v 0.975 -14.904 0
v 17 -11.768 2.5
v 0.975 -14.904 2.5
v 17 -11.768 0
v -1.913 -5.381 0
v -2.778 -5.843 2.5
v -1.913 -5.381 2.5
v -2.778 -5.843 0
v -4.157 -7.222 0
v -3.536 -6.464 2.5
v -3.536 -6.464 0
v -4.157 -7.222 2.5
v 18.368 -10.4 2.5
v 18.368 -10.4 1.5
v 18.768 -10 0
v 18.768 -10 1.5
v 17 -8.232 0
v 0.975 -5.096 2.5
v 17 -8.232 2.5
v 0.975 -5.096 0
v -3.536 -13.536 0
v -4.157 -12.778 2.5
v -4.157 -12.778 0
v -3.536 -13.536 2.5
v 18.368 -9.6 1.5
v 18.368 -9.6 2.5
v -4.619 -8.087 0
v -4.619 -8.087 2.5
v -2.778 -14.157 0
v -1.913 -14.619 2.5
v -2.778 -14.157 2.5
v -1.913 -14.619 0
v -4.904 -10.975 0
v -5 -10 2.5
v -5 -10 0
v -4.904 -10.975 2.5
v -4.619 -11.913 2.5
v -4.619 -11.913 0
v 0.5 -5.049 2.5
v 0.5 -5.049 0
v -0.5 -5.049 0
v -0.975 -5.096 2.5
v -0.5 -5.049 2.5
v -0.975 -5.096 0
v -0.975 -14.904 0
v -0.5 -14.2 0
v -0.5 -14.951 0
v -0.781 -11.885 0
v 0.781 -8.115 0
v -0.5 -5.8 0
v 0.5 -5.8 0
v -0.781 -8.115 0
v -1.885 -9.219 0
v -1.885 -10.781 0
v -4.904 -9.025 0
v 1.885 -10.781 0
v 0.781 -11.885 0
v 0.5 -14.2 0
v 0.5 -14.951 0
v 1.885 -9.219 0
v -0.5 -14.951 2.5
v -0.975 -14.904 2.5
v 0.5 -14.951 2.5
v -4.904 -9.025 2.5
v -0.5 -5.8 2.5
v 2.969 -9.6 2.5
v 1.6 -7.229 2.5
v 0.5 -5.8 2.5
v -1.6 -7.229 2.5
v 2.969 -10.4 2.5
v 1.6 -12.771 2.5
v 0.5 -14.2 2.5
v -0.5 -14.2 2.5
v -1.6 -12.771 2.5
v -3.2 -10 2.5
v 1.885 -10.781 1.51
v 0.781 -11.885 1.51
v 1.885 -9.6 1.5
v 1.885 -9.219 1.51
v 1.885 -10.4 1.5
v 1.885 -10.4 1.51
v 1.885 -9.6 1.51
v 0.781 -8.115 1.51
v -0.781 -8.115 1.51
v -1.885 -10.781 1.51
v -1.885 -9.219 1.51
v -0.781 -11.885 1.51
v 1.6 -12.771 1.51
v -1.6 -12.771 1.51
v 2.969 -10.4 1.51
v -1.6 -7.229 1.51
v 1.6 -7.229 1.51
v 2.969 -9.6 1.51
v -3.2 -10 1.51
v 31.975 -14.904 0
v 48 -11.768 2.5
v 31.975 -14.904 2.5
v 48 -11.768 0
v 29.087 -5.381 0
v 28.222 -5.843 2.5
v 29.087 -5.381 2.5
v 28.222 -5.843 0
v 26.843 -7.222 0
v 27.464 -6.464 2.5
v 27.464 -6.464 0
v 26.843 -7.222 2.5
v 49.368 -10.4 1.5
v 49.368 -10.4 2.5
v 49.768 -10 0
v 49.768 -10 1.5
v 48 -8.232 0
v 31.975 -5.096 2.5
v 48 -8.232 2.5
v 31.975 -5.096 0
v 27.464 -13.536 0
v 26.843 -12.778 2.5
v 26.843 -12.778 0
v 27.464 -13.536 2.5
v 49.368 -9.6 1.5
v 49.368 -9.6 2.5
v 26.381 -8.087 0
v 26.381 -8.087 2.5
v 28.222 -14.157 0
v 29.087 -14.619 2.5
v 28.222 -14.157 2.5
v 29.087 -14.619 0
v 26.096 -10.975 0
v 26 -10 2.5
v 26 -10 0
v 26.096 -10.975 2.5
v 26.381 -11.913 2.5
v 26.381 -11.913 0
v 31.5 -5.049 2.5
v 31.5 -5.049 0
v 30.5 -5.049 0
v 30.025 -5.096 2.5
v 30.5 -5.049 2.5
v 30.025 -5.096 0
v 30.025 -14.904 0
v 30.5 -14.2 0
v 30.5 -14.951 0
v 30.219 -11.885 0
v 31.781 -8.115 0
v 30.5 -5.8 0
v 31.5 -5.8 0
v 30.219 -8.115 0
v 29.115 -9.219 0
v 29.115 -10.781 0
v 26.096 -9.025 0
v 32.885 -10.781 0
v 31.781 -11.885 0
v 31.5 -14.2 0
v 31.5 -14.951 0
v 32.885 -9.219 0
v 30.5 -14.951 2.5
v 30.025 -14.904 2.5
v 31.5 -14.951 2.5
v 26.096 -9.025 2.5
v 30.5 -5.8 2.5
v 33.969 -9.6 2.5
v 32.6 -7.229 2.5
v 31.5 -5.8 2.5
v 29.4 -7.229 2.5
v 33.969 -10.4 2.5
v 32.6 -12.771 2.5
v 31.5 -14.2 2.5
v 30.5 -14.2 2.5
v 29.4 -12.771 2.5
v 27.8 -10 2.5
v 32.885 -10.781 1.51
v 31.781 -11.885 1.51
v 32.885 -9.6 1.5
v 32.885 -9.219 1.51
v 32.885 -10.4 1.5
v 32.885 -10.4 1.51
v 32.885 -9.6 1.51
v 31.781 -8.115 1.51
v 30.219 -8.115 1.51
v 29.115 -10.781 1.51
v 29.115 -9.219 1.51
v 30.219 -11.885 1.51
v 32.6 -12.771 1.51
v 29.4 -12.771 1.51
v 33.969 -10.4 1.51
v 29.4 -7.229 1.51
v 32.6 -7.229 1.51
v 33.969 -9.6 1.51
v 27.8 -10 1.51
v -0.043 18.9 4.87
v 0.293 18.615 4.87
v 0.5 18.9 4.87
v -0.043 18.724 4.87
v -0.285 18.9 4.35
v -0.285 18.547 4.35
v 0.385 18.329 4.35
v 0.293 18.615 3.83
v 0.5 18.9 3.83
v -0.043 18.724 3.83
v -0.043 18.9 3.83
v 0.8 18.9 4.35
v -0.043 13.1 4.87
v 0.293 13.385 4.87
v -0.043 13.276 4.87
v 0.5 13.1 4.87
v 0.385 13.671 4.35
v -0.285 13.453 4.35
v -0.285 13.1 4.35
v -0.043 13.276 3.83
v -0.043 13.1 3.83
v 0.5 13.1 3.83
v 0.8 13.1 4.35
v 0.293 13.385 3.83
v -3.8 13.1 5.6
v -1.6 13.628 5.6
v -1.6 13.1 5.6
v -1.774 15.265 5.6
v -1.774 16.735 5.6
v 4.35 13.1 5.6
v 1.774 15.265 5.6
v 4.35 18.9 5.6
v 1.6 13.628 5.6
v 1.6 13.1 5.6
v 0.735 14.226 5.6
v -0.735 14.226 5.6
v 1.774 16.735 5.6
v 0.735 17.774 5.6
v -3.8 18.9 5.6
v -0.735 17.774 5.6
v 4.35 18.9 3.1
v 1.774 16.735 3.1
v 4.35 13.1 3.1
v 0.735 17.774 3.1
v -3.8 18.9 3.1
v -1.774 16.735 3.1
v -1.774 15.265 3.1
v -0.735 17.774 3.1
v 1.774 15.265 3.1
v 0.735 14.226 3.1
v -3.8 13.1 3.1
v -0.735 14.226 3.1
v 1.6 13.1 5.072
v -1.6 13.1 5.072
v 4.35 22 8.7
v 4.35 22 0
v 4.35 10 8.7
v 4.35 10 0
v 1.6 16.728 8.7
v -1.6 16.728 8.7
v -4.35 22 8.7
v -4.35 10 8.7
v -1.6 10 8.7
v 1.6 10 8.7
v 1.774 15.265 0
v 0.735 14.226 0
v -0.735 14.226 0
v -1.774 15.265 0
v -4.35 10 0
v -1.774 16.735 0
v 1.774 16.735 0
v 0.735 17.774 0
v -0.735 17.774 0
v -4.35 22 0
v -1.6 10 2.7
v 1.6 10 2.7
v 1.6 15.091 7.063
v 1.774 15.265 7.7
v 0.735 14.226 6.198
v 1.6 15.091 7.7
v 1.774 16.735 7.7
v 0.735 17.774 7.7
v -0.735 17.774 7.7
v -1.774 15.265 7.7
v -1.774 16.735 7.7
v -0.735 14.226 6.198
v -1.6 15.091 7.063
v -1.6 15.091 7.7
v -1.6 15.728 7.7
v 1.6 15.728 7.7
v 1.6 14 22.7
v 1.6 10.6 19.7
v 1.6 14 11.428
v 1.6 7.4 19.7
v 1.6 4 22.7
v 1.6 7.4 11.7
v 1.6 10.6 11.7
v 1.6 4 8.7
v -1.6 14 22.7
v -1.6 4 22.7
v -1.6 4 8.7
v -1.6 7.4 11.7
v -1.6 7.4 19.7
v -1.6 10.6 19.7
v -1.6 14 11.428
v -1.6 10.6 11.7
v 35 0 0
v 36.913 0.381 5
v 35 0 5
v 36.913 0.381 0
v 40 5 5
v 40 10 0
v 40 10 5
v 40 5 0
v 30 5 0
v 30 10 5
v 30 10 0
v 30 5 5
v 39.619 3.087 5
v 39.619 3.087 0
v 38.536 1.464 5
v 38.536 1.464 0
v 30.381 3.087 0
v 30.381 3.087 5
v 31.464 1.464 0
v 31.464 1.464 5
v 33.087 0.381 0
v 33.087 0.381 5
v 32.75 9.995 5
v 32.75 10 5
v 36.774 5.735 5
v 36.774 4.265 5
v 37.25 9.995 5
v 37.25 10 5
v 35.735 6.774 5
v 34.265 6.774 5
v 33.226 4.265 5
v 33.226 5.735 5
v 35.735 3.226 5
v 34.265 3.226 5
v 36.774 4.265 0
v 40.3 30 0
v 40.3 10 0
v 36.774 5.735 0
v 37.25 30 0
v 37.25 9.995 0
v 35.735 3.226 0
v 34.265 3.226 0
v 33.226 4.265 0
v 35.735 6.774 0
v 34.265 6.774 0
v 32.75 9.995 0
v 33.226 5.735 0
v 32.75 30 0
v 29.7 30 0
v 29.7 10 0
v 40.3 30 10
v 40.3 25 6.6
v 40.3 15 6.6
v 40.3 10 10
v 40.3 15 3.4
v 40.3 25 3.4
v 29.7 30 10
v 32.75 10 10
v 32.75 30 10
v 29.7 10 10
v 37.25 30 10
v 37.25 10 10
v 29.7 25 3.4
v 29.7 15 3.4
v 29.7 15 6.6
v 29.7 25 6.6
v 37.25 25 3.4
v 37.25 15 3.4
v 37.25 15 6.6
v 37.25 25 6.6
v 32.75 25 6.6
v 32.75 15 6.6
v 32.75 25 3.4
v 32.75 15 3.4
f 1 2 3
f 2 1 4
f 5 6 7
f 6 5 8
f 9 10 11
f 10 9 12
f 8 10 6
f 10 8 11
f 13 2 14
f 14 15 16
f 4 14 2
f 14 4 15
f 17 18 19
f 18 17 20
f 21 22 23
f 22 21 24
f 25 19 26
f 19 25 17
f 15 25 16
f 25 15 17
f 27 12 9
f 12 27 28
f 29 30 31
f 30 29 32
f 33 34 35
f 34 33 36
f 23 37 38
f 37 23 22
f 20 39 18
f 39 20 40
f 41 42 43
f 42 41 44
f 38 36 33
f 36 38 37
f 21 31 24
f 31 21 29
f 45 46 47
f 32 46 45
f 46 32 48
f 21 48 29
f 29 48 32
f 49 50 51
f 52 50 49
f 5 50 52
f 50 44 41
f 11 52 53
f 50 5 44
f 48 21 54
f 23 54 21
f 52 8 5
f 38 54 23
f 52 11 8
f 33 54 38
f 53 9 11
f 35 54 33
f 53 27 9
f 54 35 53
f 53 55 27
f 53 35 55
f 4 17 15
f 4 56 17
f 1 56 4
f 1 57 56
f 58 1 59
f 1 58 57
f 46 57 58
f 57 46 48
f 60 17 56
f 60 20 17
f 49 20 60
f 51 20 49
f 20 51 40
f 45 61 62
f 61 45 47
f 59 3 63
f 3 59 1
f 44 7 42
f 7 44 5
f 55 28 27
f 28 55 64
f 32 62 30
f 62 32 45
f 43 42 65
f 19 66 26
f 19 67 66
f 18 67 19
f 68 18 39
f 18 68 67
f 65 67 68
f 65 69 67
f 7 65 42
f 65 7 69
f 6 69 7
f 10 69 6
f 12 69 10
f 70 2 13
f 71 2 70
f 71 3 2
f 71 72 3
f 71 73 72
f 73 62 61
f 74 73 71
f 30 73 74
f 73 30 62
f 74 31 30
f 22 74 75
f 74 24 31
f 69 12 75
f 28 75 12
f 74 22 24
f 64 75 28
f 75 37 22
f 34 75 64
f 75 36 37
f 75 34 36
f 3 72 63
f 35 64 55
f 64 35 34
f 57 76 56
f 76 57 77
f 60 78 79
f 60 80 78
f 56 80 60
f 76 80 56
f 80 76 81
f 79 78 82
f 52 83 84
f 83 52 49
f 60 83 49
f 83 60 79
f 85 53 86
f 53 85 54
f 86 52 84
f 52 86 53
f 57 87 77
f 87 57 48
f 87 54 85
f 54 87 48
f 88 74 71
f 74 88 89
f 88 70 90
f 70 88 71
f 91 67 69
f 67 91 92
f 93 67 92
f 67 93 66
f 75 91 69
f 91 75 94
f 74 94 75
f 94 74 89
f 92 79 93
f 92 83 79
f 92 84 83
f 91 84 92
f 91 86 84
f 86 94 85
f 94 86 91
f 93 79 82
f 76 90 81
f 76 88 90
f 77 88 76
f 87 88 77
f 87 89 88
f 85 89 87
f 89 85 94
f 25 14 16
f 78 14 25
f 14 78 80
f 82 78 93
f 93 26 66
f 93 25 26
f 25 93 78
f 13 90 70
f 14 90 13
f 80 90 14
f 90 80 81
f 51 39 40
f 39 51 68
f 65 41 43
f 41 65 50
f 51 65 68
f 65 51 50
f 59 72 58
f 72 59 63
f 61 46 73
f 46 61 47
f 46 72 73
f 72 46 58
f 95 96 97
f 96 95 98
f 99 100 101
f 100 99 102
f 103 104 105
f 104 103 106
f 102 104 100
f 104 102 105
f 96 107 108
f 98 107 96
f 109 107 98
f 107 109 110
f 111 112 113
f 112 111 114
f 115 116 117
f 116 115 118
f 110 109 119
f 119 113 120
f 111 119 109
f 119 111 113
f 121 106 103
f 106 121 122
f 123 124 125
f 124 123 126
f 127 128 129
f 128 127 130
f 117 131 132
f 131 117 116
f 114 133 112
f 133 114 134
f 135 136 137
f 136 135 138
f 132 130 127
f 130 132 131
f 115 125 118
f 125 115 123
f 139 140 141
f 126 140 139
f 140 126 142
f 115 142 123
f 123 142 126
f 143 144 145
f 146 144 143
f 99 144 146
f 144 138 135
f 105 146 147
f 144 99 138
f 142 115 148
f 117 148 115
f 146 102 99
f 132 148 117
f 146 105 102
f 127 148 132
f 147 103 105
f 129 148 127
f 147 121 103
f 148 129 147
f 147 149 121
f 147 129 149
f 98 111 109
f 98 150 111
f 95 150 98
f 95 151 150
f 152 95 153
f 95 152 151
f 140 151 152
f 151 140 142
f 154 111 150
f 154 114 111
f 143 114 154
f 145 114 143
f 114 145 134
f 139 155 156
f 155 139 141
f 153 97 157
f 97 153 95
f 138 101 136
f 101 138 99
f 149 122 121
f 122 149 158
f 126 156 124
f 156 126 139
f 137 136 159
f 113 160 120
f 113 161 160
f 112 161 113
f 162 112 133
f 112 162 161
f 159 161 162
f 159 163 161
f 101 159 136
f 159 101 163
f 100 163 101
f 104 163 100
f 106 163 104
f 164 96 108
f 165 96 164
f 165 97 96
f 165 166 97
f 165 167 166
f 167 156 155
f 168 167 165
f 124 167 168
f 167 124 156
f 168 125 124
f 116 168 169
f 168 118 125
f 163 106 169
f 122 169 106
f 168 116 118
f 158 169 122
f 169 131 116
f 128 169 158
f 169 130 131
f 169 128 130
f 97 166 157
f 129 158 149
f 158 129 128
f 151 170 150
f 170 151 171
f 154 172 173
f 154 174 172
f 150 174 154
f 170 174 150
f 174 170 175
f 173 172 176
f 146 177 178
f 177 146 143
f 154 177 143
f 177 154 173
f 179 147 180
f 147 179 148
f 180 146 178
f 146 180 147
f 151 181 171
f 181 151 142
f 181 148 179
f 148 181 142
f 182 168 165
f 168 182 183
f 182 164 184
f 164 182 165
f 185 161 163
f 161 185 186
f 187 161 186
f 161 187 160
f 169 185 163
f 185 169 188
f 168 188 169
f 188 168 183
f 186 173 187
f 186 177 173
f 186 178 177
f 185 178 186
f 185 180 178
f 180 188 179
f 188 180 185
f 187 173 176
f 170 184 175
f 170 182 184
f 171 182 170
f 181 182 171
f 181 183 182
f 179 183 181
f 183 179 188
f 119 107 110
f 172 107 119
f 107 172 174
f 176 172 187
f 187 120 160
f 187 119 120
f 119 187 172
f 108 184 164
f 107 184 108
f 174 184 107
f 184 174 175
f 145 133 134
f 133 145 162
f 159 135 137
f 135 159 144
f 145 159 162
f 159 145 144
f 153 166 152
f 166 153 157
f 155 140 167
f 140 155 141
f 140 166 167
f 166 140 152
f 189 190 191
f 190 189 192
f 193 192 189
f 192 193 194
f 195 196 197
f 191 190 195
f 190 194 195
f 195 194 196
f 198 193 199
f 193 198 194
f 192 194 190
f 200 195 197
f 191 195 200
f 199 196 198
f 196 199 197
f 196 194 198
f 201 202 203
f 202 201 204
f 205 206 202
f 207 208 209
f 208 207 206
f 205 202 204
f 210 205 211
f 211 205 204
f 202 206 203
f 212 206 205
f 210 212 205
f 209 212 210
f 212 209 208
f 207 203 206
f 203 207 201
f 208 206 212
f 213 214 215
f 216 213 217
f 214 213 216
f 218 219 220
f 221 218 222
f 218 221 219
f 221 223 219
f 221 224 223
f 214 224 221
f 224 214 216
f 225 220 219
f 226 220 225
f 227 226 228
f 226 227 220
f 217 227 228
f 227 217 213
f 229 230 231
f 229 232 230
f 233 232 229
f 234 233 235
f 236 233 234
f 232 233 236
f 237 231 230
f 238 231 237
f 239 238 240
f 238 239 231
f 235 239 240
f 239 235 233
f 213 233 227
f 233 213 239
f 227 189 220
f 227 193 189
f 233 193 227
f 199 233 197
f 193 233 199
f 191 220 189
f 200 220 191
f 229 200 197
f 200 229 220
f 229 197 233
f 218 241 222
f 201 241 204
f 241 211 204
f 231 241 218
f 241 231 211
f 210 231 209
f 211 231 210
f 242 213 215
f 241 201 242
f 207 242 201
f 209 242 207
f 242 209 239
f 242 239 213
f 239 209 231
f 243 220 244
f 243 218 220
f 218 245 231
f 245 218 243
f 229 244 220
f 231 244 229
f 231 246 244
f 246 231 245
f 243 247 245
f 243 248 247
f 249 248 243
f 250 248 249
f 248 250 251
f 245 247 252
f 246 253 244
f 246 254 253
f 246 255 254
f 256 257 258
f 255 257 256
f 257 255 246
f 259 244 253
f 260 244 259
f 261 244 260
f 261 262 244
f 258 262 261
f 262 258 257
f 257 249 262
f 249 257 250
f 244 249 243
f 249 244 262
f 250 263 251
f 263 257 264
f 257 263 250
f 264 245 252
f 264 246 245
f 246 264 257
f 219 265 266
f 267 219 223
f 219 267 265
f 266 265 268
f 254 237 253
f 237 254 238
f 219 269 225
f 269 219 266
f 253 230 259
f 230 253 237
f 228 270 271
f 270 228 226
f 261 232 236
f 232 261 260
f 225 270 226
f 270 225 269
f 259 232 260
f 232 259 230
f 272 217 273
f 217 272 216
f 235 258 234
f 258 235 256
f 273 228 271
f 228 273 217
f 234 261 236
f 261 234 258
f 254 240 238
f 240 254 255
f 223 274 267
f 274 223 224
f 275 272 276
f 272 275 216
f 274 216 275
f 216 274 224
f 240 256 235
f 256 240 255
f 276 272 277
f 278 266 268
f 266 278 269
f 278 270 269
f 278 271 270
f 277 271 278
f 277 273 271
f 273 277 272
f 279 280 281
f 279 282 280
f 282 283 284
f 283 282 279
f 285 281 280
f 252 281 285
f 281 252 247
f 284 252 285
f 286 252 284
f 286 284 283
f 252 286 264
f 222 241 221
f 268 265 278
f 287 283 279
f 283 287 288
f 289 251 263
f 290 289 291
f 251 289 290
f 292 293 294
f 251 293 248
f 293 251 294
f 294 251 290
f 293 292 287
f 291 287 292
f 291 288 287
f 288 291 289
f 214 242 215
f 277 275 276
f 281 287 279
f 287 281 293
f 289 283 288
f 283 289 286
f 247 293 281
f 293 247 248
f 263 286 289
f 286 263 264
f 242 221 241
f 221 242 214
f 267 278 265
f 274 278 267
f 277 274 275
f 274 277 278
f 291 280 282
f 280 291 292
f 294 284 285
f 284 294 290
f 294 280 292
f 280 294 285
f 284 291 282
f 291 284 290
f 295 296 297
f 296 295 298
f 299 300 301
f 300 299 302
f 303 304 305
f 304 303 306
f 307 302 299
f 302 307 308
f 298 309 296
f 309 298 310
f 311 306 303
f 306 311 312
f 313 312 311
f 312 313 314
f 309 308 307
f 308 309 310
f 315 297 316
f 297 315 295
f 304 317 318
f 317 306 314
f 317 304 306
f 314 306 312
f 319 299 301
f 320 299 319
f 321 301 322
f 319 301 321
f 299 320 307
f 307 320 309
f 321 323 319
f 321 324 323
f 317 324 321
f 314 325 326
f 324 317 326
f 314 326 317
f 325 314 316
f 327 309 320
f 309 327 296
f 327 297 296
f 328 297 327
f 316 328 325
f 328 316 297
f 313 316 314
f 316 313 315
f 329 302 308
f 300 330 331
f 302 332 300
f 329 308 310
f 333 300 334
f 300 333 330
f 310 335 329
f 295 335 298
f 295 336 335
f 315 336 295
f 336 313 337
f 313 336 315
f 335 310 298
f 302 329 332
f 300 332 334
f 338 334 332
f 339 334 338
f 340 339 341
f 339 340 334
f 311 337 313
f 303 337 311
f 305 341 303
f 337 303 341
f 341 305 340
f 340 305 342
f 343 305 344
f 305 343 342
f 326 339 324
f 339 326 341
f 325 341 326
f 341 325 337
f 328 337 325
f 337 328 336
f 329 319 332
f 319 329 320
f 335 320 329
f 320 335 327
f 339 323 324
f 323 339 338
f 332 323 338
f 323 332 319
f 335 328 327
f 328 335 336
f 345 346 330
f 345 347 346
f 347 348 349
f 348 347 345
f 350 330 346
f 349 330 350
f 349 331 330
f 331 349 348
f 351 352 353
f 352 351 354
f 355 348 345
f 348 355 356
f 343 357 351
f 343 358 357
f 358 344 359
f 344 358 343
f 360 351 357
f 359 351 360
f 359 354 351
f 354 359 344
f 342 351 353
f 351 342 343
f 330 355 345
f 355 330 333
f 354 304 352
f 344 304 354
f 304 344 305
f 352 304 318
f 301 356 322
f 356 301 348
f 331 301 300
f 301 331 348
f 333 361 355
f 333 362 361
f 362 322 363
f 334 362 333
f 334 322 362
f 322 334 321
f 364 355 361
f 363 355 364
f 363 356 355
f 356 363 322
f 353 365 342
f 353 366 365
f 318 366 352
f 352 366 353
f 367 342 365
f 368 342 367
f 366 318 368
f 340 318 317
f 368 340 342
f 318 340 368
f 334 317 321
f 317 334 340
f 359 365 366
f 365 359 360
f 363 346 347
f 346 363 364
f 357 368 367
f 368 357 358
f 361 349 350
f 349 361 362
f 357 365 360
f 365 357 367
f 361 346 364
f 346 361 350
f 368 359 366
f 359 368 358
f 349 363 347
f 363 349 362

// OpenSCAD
// file: ../library/m3_parts.scad
// m3_parts.scad - A collection of things useful when developing with M3 fasteners
// (c)2025 vik@diamondage.co.nz, released under the GPL V3 or later

m3_screw_rad=3.4/2; // M3 screw hole radius
m3_screw_head_rad=5.9/2;    // Radius of the average M3 posi screw head
m3_screw_head_height=2.4;
m3_nut_max_width=6.4;     // M3 Nut from point to point.
m3_pillar_max_width=5.9;    // M3 pillar width, point to point
m3_nut_height=2.5;
m3_nut_min_width=5.8;  // Nut from flat to flat

// NEMA17 motors are *technically* M3 parts...
nema17_screw_sep=31;
nema17_collar_rad=22.5/2;   // The raised collar around the NEMA output shaft
nema17_face_len=42;         // Length of the square face of a NEMA17 ignoring bevels

// Cavity for M3 nut that goes into the top of things. Slight overshoot to avoid booleans
module m3_nut_cavity(ht=m3_nut_height) {
    translate([0,0,0.01]) cylinder(h=ht+0.01,r=m3_nut_max_width/2,$fn=6);
}

// A nut cavity for putting underneath things, with a nod to overhangs
// Has a conical top to print without support. Projects very slightly down to remove boolean issues.
// Making it captive adds little bumps inside that make it hard to insert and remove the nut
module m3_nut_cavity_tapered(captive=false) {
    difference() {
        union() {
            // Tapered avity for m3 nut
            translate([0,0,-0.01]) cylinder(h=m3_nut_height+0.01,r=m3_nut_max_width/2,$fn=6);
            translate([0,0,m3_nut_height])
                cylinder(h=1,r1=m3_nut_max_width/2,r2=m3_screw_rad*1.2,$fn=6);
        }
        if (captive) {
            divot_rad=0.4;
            rotate([0,0,30]) translate([m3_nut_max_width*0.42,0,m3_nut_height/2])
                sphere(divot_rad);
            rotate([0,0,30+120]) translate([m3_nut_max_width*0.42,0,m3_nut_height/2])
                sphere(divot_rad);
            rotate([0,0,30-120]) translate([m3_nut_max_width*0.42,0,m3_nut_height/2])
                sphere(divot_rad);

        }
    }
}

// Nut  slot for M3 nut
module m3_nut_slot(l=100) {
    difference() {
        // Long slot
        translate([-m3_nut_max_width/2,-m3_nut_min_width/2,0])
            cube([m3_nut_max_width+l,m3_nut_min_width,m3_nut_height]);
        // Small knobs to retain nut
        translate([0.2,m3_nut_min_width/2,m3_nut_height/2]) sphere(0.5);
        translate([0.2,-m3_nut_min_width/2,m3_nut_height/2]) sphere(0.5);
    }
}

// Cavity for an M3 screw and screw head of specified length.
// Points down. Uses octagons so that it can be printed horizontally
module  m3_screw_cavity(screw_len) {
    rotate([180,0,360/16]) cylinder(h=screw_len,r=m3_screw_rad*1.2,$fn=8);
    // Rotate to make hole sflats parallel to axes. Tiny shift to fix booleans
    rotate([0,0,360/16]) translate([0,0,-0.001])
        cylinder(h=10,r=m3_screw_head_rad*1.2,$fn=8);
}

// Octagonal hole for screw, no head, centred, length extends up and down
module  m3_screw_hole(screw_len) {
    rotate([180,0,360/16]) cylinder(h=screw_len,r=m3_screw_rad*1.2,$fn=8,center=true);
}

m3_thumbscrew_height=5;
m3_thumbscrew_rad=5;
// Thumbscrew with ridges. Screw head fits in top depression, nut on screw
// shaft holds it in place.
//  rad: Optional radius for thumbscrew knob (default 5, see above)
module m3_thumbscrew_knob(rad=m3_thumbscrew_rad) {
    m3_thumbscrew_ridges=floor(rad*3.2);
    difference() {
        union() {
            for (i=[0:m3_thumbscrew_ridges]) rotate([0,0,360/m3_thumbscrew_ridges*i])
                translate([rad,0,m3_thumbscrew_height/2])
                    cube([1,1,m3_thumbscrew_height],center=true);
            cylinder(h=m3_thumbscrew_height,r=rad);
        }
        translate([0,0,m3_thumbscrew_height-m3_screw_head_height]) m3_screw_cavity(m3_thumbscrew_height);
    }
}
// main file
// maus_probe.scad - Probe head components for Maus 3D Printer
// (c)2024 vik@diamondage.co.nz, released under the terms of the GPL V3 or later

version_string="MAUS V0.05";

include <../library/m3_parts.scad>
include <../library/metriccano.scad>


// 0.6mm thick text, 5mm tall, vertical, flat on XY plane
module version_text() {
    translate([0,0,-0.3]) linear_extrude(0.6) {
        text(version_string, size = 4, halign = "center", valign = "center", $fn = 16);
    }
}

// Probe tip. Now with handling notches for tweezers
probe_tip_thick=2.5;
probe_tip_len=17;   // Length of probe from centre of securing pivot.
module probe_tip_arm() difference() {
    hull() {
        cylinder(h=probe_tip_thick,r=metriccano_unit/2,$fn=32);
        translate([probe_tip_len,0,probe_tip_thick/2]) rotate([0,0,45]) cube(probe_tip_thick,center=true);
    }
    // Retaining pivot hole
    m3_screw_hole(probe_tip_thick*3);
    // Nut well
    translate([0,0,probe_tip_thick-1]) m3_nut_cavity();
    // Notch to retain probe wire
    translate([0,-0.4,probe_tip_thick-1])
        cube([probe_tip_len*2,0.8,probe_tip_thick]);
    // Handling notches
    translate([0,metriccano_unit/2,0]) cube([1,1.6,10],center=true);
    translate([0,-metriccano_unit/2,0]) cube([1,1.6,10],center=true);
}

// 100mm long beam for testing flexure deflection with a 10g weight (.38 cal bullet)
test_pan_rad=10; // Radius of test pan cavity for weights
test_arm_len=100;
module test_flexure() {
    flexure_tab();
    // 100mm beam with pan on the end
    difference() {
        union() {
            translate([flexure_length/2,-4,0]) cube([100,8,8]);
            translate([flexure_length/2+test_arm_len,0]) cylinder(h=10,r=test_pan_rad+wall);
            // Wee spike on the end.
            translate([flexure_length/2+test_arm_len+test_pan_rad+wall-0.5,0,0.5])
                rotate([0,0,45]) cube([4,4,1],center=true);
        }
        // Scalop it out
        translate([flexure_length/2+test_arm_len,0,1]) cylinder(h=100,r=test_pan_rad);
    }
    // Anchor plate
    translate([-flexure_length/2-metriccano_unit*1.5,-metriccano_unit/2,0]) metriccano_plate(2,2);
}

// The probe holding sytem is a complex affair. Two (reversible) brackets hold a beam
// with a slotted blade under it. A shuttle shaped a bit like a tuning fork fits astride this 
// beam, and has the Probe Tip Arm bolted to it. The bolt holes are slotted, allowing
// the probe to move up/down/back/forth and tilt.
// A screw driven in from above locks the beam in place.

probe_beam_standoff=3;  // Keep this far away from the Driver to avoid flexing flexures
pbr_clearance=0.65;      // Clearance on sliding probe beam parts (washer+0.05)
pbr_length=12;
pbr_width=metriccano_unit-2*pbr_clearance;
pbr_height=metriccano_unit-2*pbr_clearance;
pbr_blade_thick=metriccano_screw_rad*2;     // Why not make the blade fit over a screw?
pbr_blade_width=metriccano_unit;
pbr_blade_height=14;        // WAG
pbr_blade_setback=6;        // Move the blade this far off centre

probe_shuttle_length=20;    // Length of the shuttle (not including probe mount) WAG

// A runner bracket for the probe beam, attaching to the Z Axis Driver
module probe_beam_runner() {
}

// The beam that is clamped  underneath the Z Driver.
// Has a blade that the  beam shuttle attaches to.
module probe_beam() {
    difference() {
        // Body of the beam
        translate([-pbr_width/2,0,0]) cube([pbr_width,pbr_length,pbr_height]);
        // Nut slot for nut that retains the beam
        translate([0,pbr_length/2,(pbr_height-metriccano_nut_height)/2]) 
            metriccano_nut_slot();
        // Hole for the screw to access the nut
        translate([0,pbr_length/2,0]) metriccano_screw_hole(pbr_height*2-2);
    }
    // The blade that protrudes from the beam
    translate([0,-pbr_blade_setback,pbr_height]) difference() {
        // Blade body
        union() {
            translate([-pbr_blade_thick/2,0,0])
                cube([pbr_blade_thick,pbr_blade_width,pbr_blade_height]);
            // Angled lead-in to overhanging blade
            translate([-pbr_blade_thick/2,0,0]) rotate([-45,0,0]) cube([pbr_blade_thick,pbr_blade_setback*1.5,pbr_blade_setback*1.5]);
        }
        // The slot for the screw
        translate([-pbr_blade_thick*2,pbr_blade_width/2-metriccano_screw_rad,3])
            cube([pbr_blade_thick*4,metriccano_screw_rad*2,pbr_blade_height-6]);
    }
}

// The bit that holds the Probe Arm Tip and clamps onto the Probe Beam Blade
// Uses Metriccano thicknesses except for the blade slot.
module probe_shuttle() {
    difference() {
        // Body of the shuttle
        union() {
            translate([-metriccano_unit/2-0.3,0,0])
                cube([metriccano_unit+0.6,probe_shuttle_length,metriccano_unit]);
            // Mounting hole to screw the probe arm to.
            translate([0,-metriccano_unit/2,0]) rotate([0,0,180]) metriccano_tab_module(1);
        }
        // Blade slot
        translate([0,probe_shuttle_length/2,0]) 
            cube([pbr_blade_thick+2*pbr_clearance,probe_shuttle_length+0.01,metriccano_unit*3],center=true);
        // Screw slots (do not make too long, or it'll all collapse when printed...)
        translate([0,probe_shuttle_length/2,metriccano_unit/2]) 
            cube([metriccano_unit*3,probe_shuttle_length-metriccano_unit,metriccano_screw_rad*2],center=true);        
    }
}

// Probe tip and holder parts, slide holding parts.
if (true) {
    // Commented out parts not used in V0.05
    translate([0,-10,0]) probe_tip_arm();
    translate([31,-10,0]) probe_tip_arm();
    translate([0,10,0]) probe_beam();
    translate([35,10,0]) probe_shuttle();
}
